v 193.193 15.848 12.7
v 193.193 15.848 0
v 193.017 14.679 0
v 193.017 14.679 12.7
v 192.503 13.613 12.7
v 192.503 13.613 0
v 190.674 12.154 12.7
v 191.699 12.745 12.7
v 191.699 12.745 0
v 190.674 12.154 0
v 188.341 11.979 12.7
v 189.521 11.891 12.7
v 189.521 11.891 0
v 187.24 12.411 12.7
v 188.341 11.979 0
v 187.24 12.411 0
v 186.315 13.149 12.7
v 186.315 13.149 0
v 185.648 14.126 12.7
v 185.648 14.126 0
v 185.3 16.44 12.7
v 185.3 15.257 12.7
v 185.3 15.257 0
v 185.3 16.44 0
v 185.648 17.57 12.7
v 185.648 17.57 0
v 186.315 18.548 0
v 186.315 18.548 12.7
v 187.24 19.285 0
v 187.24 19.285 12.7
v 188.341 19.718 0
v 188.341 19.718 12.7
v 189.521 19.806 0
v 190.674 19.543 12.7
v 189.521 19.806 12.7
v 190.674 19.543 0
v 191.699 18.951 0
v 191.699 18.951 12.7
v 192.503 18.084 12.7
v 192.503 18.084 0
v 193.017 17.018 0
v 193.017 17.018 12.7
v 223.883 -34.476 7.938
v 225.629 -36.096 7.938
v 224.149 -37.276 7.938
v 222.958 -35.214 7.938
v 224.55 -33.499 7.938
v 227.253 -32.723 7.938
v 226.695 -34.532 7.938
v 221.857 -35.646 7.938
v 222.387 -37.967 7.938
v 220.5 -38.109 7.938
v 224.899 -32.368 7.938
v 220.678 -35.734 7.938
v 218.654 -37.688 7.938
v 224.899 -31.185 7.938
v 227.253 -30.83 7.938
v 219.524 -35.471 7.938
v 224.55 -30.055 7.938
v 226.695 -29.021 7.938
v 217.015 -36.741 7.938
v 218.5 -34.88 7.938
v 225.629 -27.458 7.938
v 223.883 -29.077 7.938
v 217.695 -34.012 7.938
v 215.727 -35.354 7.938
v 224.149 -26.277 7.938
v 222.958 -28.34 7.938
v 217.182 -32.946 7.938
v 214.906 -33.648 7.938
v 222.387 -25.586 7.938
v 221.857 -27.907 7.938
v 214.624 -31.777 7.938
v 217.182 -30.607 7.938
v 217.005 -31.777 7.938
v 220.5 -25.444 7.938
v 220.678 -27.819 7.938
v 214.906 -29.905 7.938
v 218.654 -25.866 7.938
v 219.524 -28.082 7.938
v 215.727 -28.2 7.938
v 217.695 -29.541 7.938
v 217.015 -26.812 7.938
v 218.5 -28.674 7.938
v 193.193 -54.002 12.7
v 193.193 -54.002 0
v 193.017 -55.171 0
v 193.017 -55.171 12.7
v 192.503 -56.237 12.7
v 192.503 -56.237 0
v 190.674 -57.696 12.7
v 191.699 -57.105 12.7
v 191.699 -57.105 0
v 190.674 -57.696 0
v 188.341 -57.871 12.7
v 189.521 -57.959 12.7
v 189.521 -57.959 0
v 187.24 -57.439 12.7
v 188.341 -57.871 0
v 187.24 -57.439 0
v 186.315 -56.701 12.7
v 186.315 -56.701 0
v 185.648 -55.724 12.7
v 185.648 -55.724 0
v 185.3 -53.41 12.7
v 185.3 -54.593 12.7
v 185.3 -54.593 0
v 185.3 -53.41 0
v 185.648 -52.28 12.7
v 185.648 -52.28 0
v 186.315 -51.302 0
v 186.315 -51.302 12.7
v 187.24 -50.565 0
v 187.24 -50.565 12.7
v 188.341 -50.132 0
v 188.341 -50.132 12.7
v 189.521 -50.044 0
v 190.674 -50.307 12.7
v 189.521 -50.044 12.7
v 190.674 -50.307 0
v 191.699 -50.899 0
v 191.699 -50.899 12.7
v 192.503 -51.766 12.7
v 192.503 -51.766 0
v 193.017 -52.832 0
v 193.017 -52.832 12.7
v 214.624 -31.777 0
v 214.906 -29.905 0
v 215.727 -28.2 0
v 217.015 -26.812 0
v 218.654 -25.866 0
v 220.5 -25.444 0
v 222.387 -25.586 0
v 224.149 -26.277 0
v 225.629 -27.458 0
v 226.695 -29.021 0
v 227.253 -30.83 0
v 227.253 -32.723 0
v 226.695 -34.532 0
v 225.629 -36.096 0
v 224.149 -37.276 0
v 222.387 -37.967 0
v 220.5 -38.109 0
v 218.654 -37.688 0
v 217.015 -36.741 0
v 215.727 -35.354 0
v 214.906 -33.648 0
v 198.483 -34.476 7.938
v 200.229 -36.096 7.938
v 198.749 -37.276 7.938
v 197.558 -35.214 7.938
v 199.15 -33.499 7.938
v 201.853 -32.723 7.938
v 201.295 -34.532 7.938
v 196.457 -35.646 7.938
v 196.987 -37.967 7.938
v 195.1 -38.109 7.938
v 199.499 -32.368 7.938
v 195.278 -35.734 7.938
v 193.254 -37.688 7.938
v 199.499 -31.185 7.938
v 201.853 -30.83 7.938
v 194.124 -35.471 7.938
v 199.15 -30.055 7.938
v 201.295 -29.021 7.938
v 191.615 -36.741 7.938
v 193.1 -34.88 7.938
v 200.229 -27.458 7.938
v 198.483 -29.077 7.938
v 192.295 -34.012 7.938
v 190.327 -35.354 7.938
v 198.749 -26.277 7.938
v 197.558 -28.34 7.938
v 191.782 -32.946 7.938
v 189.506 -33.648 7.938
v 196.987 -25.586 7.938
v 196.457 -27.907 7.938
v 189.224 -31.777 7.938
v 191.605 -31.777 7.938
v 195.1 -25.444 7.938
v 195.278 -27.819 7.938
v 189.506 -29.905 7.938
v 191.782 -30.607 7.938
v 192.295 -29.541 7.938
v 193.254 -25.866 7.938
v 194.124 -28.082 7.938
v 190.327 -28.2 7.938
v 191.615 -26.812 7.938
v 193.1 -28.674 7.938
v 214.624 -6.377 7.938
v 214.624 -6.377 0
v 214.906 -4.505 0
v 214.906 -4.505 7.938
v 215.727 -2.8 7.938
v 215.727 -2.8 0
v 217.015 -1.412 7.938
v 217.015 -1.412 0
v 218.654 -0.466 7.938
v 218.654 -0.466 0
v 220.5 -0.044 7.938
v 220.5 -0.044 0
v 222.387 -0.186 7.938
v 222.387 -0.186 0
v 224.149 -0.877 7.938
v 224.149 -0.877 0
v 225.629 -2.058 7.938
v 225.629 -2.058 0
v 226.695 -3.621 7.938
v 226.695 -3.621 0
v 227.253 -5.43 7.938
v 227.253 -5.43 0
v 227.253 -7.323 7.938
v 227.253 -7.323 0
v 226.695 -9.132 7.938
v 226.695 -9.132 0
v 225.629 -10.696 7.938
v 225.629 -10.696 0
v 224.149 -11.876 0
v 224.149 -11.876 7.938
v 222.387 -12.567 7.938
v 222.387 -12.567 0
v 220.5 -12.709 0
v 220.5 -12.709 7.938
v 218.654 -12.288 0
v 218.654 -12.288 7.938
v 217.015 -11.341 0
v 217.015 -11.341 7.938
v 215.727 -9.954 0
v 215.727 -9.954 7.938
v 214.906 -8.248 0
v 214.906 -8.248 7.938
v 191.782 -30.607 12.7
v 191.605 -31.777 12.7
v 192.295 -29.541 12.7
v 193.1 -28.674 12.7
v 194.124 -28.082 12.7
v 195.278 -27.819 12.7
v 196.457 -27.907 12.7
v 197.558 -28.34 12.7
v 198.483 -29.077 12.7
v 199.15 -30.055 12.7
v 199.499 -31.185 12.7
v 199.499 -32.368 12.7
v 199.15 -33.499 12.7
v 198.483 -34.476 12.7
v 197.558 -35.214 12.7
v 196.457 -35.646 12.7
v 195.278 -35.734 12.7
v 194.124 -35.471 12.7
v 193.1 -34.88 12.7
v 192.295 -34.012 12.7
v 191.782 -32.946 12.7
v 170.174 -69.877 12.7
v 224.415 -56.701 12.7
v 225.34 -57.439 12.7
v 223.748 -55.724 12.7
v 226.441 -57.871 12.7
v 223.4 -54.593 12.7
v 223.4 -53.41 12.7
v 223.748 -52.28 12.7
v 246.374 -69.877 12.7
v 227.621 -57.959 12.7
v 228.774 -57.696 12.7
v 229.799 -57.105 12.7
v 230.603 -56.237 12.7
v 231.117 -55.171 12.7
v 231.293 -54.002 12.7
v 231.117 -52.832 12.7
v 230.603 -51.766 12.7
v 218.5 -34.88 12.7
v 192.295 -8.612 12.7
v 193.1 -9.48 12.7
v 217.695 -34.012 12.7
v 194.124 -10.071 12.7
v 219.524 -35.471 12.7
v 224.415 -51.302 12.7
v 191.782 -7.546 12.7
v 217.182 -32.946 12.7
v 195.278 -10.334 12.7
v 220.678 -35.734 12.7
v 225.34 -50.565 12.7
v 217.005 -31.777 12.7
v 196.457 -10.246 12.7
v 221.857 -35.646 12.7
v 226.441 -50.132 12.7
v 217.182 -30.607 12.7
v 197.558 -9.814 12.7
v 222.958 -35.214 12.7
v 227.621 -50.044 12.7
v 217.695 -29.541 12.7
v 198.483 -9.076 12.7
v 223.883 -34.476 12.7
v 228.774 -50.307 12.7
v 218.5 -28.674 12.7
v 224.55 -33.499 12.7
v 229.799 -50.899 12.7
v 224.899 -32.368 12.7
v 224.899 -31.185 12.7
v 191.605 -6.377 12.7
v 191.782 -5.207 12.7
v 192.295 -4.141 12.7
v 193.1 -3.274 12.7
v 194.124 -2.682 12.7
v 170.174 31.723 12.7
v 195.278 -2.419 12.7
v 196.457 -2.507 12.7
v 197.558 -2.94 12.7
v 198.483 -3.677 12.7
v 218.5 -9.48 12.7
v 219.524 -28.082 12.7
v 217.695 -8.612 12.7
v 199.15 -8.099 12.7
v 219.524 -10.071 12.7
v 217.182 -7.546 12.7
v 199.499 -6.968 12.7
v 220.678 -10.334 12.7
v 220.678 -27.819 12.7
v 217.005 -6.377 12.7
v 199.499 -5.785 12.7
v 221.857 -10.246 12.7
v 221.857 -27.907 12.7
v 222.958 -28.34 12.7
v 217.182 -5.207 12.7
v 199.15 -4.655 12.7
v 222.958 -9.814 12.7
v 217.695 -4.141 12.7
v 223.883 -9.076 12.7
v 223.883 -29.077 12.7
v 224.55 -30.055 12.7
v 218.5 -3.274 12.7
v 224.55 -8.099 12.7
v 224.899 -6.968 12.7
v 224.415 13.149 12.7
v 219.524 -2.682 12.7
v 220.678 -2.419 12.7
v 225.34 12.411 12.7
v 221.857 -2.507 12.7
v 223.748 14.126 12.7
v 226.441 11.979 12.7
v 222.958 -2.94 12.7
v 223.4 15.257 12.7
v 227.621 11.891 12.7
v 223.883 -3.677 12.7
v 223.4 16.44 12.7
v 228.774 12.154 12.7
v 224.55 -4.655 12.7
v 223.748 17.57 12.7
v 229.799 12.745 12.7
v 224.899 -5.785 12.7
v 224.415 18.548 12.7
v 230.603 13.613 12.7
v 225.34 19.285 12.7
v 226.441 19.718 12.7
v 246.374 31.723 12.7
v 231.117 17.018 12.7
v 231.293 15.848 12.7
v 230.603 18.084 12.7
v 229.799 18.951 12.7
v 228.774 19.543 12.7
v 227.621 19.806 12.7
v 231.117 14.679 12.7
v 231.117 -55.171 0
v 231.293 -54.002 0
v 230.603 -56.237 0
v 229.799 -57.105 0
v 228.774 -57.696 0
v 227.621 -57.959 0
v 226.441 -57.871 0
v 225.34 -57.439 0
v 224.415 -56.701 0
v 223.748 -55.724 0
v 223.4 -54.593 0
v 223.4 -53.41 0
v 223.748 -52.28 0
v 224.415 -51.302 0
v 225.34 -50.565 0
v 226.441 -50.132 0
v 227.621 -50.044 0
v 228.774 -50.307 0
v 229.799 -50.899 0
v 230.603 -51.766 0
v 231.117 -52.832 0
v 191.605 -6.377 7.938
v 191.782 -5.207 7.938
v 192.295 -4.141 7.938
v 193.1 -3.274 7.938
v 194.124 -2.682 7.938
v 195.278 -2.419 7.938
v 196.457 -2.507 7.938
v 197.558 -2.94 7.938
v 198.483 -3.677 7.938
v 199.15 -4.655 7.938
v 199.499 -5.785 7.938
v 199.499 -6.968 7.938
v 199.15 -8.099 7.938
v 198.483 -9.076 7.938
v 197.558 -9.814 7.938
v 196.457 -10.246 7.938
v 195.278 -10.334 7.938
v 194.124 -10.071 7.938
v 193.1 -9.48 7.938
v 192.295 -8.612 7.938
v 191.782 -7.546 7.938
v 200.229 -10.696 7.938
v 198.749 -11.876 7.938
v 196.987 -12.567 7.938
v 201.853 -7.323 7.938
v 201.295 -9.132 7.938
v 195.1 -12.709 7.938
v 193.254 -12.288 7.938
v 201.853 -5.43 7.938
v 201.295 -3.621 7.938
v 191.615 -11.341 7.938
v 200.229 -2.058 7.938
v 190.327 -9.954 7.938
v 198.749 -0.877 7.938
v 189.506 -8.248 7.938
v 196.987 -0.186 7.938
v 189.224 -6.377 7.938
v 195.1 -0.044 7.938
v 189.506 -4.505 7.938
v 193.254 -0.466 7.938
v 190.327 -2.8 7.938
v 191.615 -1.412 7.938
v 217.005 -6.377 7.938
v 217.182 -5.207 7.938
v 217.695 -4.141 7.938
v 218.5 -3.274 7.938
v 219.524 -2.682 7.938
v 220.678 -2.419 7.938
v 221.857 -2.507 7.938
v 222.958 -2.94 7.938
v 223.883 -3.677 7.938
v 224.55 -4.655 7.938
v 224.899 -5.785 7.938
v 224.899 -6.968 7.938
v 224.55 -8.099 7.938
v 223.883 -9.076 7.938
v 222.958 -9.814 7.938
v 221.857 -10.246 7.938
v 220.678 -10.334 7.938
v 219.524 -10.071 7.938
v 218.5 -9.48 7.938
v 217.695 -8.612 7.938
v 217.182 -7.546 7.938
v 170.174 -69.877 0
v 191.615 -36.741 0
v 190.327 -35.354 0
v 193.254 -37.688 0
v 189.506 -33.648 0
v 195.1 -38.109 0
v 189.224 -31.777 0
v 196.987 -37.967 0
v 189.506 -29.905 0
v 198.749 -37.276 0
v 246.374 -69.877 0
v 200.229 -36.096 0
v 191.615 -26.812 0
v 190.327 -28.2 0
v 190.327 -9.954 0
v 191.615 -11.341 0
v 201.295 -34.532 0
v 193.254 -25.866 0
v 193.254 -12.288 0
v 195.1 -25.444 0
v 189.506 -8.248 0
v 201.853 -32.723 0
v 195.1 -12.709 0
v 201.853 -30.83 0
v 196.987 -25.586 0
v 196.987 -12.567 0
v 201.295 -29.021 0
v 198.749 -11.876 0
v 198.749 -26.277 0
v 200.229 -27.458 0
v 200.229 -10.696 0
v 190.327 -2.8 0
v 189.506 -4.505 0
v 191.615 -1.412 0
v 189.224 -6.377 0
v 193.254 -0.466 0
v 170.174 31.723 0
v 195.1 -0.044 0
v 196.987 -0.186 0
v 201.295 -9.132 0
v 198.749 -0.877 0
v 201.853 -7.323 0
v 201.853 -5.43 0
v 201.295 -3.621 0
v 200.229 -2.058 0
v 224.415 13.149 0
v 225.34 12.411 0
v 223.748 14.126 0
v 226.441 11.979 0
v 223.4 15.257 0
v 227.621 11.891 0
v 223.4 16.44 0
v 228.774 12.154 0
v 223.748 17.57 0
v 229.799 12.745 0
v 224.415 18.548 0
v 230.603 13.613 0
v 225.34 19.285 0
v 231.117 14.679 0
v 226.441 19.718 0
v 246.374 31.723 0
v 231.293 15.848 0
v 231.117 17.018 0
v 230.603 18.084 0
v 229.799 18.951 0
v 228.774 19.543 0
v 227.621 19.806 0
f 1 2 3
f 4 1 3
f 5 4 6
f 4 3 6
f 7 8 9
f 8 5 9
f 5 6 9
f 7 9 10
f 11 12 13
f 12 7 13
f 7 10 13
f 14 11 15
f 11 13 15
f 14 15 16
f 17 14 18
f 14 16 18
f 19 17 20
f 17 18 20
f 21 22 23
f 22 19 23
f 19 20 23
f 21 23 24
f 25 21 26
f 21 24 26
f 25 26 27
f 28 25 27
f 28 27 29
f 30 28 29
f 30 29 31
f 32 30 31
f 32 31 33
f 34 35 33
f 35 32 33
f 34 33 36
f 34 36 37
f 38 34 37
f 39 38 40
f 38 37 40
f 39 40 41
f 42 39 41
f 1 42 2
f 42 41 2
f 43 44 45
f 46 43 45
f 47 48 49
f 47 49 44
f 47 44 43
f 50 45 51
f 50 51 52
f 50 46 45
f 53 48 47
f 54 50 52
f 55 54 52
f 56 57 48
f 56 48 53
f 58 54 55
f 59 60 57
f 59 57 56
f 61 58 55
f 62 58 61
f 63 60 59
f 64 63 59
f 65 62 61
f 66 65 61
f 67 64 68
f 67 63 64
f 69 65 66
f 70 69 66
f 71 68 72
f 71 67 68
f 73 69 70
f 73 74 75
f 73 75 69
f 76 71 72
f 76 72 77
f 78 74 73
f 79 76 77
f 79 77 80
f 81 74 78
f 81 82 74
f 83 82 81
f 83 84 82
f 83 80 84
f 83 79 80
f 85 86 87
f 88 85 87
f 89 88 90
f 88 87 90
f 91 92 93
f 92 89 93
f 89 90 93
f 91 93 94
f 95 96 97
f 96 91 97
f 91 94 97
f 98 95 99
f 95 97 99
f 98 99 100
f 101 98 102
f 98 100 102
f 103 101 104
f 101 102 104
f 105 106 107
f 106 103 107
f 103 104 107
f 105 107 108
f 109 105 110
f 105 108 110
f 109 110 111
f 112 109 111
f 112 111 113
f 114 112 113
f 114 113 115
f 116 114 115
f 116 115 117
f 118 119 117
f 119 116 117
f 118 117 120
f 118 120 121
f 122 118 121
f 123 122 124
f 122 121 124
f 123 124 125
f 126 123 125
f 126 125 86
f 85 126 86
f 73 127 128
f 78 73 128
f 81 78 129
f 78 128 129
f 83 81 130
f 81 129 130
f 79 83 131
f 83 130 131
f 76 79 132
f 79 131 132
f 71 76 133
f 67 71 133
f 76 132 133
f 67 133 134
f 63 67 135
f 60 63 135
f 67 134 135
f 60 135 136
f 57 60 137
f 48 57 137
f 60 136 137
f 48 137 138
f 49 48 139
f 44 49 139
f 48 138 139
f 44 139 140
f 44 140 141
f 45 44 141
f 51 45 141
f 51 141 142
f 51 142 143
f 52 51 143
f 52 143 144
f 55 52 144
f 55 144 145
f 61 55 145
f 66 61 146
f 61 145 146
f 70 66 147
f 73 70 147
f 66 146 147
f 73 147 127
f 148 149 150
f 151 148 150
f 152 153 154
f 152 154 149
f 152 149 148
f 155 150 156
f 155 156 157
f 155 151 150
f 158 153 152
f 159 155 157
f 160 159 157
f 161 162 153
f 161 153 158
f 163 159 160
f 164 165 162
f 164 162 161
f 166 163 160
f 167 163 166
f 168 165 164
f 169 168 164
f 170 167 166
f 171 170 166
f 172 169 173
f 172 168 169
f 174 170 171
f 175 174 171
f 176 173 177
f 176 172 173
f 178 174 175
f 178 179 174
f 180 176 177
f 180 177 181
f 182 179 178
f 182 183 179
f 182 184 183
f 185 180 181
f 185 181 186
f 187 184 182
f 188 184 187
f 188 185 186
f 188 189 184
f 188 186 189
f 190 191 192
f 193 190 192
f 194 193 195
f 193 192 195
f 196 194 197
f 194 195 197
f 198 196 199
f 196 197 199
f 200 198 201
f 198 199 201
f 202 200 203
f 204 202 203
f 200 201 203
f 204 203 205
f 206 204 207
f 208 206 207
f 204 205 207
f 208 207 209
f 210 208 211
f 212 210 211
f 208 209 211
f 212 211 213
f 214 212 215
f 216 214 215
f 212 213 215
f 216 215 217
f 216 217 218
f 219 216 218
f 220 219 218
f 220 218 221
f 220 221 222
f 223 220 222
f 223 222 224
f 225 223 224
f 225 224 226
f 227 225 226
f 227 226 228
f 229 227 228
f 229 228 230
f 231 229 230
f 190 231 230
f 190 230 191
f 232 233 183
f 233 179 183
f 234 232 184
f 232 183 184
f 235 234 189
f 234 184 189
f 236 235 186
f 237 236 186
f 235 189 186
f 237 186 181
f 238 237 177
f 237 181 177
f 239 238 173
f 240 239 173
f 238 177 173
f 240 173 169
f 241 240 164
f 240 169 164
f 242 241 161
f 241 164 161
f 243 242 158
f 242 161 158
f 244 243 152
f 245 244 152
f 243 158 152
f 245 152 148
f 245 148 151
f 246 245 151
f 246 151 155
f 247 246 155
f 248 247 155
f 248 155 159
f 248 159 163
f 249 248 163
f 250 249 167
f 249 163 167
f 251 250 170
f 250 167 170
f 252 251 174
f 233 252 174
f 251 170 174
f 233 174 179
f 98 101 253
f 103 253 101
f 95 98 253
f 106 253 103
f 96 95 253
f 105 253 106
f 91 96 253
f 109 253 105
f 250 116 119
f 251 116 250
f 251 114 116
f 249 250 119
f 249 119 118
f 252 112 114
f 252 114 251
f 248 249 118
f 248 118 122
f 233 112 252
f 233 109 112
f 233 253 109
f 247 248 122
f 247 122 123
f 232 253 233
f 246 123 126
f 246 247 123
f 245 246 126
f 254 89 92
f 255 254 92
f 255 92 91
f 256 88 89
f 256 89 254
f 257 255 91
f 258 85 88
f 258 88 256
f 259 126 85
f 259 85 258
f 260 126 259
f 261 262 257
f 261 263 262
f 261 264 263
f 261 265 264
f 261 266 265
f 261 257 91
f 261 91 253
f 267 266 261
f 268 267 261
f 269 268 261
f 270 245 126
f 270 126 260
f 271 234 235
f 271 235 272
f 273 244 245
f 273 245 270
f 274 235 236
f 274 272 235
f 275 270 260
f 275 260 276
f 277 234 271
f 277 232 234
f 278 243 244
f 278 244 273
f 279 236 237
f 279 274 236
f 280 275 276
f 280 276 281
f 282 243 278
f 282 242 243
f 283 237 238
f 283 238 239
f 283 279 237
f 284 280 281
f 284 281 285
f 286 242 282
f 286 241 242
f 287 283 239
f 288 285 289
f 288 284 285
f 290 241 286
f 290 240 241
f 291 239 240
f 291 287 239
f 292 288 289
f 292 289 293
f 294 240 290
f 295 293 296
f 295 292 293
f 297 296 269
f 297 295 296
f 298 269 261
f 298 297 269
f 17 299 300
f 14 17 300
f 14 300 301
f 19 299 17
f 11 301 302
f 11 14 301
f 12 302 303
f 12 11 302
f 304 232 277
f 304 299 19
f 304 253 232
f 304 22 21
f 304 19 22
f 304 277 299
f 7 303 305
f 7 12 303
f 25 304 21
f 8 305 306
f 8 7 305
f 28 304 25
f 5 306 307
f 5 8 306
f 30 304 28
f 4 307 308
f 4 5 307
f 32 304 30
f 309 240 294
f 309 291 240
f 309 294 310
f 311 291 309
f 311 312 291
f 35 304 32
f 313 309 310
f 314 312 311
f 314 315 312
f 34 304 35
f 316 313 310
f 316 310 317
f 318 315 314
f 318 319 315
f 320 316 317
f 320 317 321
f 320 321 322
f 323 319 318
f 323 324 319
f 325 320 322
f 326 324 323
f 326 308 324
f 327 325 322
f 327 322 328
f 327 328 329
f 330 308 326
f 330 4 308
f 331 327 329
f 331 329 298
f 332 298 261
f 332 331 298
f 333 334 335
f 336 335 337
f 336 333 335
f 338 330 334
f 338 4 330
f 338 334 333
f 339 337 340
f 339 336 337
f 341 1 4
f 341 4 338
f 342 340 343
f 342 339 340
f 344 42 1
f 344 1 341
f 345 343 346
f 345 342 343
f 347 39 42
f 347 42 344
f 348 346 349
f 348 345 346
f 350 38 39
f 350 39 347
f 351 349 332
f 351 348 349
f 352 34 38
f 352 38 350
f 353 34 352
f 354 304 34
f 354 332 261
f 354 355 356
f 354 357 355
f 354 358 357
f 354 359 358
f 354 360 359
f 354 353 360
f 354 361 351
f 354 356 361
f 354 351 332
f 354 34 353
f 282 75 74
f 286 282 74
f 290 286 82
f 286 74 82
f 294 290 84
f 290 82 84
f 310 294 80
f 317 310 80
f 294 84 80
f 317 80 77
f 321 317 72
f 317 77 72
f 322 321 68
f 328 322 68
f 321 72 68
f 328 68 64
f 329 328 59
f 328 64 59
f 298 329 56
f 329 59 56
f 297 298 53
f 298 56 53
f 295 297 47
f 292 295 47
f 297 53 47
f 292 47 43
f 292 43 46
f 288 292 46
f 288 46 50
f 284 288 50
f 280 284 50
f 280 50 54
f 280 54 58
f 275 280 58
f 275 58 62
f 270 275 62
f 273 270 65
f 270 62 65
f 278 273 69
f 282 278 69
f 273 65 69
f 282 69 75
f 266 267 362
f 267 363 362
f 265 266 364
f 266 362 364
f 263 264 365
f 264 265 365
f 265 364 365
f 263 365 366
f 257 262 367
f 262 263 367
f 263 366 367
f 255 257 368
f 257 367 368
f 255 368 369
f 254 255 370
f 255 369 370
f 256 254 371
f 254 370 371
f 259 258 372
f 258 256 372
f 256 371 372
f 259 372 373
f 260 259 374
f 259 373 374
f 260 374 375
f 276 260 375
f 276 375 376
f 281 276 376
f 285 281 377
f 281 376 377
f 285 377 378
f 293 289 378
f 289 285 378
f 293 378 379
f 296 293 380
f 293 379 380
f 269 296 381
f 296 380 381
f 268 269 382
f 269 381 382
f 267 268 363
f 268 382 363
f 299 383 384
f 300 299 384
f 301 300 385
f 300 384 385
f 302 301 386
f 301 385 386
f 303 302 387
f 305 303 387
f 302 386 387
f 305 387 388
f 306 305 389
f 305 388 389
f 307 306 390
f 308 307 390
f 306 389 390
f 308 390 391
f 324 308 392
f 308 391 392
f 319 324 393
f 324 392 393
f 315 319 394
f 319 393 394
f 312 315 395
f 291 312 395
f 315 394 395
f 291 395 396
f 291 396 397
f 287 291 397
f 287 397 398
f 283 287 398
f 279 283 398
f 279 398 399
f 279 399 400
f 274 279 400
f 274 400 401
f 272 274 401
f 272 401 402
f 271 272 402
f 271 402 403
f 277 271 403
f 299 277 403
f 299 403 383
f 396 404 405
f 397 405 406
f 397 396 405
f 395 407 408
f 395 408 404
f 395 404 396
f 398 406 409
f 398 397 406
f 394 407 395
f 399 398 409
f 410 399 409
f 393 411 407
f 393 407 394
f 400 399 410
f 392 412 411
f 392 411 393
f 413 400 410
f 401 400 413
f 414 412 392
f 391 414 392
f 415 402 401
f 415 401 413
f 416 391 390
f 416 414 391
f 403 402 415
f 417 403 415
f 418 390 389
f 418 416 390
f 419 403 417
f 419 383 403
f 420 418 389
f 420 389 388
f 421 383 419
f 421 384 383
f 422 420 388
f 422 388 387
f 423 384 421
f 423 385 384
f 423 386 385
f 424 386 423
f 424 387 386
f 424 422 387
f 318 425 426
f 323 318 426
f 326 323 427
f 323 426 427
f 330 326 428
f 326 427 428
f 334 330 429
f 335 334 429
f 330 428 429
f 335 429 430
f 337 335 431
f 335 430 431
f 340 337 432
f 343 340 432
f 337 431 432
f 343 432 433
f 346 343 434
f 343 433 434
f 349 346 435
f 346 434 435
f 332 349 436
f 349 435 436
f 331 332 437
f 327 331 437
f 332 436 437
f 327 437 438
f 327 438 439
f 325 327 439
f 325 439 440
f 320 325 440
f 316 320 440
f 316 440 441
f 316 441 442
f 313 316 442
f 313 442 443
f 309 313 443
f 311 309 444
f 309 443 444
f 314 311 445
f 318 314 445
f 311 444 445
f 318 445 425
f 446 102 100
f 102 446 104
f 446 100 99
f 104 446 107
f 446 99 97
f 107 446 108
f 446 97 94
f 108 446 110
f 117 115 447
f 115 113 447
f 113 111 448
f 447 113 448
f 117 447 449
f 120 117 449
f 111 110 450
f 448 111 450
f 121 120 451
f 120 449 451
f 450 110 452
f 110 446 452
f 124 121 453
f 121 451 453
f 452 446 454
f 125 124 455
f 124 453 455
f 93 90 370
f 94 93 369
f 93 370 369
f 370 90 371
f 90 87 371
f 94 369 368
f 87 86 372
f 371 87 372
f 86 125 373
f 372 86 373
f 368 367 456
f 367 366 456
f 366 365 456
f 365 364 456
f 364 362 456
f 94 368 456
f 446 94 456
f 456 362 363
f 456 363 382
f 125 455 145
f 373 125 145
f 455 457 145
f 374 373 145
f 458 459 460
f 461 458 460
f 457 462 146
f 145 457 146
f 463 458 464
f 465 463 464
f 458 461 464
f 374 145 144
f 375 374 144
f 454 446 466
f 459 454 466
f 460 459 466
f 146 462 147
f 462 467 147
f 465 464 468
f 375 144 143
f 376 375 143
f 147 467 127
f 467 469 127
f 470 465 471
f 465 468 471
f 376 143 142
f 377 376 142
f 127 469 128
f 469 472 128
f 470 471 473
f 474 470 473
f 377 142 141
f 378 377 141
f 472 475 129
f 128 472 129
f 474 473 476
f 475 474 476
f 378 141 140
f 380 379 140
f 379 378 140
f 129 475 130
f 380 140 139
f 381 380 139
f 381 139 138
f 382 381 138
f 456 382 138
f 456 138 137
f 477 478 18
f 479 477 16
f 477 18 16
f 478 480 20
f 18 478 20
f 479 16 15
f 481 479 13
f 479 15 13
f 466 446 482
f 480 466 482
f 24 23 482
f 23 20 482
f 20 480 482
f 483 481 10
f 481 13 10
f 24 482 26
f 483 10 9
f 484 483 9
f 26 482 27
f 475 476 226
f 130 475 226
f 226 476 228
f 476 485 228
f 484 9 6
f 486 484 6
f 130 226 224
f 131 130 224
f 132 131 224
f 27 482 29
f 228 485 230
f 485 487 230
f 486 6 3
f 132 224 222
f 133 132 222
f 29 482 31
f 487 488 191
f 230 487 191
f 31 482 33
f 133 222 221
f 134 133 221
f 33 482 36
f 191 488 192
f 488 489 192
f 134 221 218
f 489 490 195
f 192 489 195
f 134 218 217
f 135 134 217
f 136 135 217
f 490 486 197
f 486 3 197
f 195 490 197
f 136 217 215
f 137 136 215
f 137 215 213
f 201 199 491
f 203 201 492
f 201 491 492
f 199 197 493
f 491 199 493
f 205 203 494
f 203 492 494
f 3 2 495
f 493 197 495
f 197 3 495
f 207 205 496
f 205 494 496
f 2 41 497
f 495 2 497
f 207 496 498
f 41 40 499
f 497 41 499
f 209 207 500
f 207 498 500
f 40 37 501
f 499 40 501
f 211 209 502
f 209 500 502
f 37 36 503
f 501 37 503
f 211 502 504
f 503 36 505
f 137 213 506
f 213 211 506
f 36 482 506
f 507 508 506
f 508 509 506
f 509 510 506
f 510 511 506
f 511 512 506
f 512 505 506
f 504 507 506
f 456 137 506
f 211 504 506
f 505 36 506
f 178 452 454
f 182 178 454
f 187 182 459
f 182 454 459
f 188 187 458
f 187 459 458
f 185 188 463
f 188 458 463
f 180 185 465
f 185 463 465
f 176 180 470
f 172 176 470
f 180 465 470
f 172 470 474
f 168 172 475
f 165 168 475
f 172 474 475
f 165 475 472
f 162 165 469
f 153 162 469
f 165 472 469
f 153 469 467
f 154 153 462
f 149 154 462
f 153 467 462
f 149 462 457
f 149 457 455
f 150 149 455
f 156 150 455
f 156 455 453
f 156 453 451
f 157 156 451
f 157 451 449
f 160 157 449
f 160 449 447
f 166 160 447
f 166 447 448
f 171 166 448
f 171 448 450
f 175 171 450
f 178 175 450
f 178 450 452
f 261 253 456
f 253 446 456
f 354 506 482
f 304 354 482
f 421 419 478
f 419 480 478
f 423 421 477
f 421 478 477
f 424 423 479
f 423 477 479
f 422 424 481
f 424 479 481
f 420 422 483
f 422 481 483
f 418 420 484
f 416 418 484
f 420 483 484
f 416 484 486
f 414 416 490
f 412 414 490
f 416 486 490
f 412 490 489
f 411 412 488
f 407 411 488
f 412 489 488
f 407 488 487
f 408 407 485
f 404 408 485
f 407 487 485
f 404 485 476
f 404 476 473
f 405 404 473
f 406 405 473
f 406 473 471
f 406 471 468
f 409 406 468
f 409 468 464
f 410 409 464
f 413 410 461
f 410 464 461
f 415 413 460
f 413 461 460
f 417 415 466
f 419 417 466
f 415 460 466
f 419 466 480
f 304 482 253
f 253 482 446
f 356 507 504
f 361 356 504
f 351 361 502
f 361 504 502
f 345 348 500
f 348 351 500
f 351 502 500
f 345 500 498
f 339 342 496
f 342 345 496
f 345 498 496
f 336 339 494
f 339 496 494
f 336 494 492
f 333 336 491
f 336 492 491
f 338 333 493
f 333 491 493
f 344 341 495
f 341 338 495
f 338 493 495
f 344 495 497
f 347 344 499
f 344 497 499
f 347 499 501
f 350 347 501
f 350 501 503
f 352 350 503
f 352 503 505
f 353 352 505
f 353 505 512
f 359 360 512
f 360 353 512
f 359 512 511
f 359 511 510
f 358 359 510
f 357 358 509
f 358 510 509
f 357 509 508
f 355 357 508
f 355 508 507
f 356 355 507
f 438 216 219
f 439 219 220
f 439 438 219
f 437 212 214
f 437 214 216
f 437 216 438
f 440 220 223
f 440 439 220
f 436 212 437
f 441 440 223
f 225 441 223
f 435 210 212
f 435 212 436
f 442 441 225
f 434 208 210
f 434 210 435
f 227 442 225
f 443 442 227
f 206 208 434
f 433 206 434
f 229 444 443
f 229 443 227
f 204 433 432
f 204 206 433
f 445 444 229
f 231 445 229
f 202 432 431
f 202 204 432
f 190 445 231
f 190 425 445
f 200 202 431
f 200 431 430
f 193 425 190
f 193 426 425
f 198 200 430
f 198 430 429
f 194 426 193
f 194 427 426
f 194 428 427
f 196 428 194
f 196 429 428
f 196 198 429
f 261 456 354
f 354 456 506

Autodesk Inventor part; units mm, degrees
ref_plane "YZ Plane" through (0, 0, 0) normal (1, 0, 0) x (0, 1, 0)
ref_plane "XZ Plane" through (0, 0, 0) normal (0, 1, 0) x (-1, 0, 0)
ref_plane "XY Plane" through (0, 0, 0) normal (0, 0, 1) x (1, 0, 0)
sketch "Sketch1" plane through (0, 0, 0) normal (0, 0, 1) x (1, 0, 0)
  line L0 (246.3741, 31.7234) -> (246.3741, -882.6766) construction
  line L1 (234.1821, 31.7234) -> (231.3881, 31.7234) construction
  line L2 (223.2601, 31.7234) -> (220.4661, 31.7234) construction
  line L3 (199.5111, 31.7234) -> (196.0821, 31.7234) construction
  line L4 (182.3661, 31.7234) -> (178.9371, 31.7234) construction
  line L5 (246.3741, 31.7234) -> (170.1741, 31.7234)
  line L6 (170.1741, 31.7234) -> (170.1741, -69.8766)
  line L7 (170.1741, -69.8766) -> (246.3741, -69.8766)
  line L8 (246.3741, -69.8766) -> (246.3741, 31.7234)
  circle A0 centre (227.3241, 15.8484) radius 3.9688
  line L9 (208.2741, -69.8766) -> (208.2741, 31.7234) construction
  line L10 (246.3741, -19.0766) -> (170.1741, -19.0766) construction
  circle A1 centre (227.3241, -54.0016) radius 3.9688
  circle A2 centre (189.2241, 15.8484) radius 3.9688
  circle A3 centre (189.2241, -54.0016) radius 3.9688
  point P0 (0, 0)
  dimension "d0" = 76.2
  dimension "d1" = 101.6
  dimension "d2" = 7.9375
  dimension "d3" = 15.875
  dimension "d4" = 19.05
extrude "Extrusion1" add sketch "Sketch1" along normal blind 12.7
sketch "Sketch3" plane through (0, 0, 0) normal (0, 0, -1) x (-1, 0, 0)
  line L0 (-186.0491, -41.3016) -> (-230.4991, -41.3016)
  line L1 (-230.4991, -41.3016) -> (-230.4991, 3.1484)
  line L2 (-230.4991, 3.1484) -> (-186.0491, 3.1484)
  line L3 (-186.0491, 3.1484) -> (-186.0491, -41.3016)
  line L4 (-170.1741, -69.8766) -> (-246.3741, -69.8766) projected
  line L5 (-170.1741, 31.7234) -> (-170.1741, -69.8766) projected
  line L6 (-246.3741, 31.7234) -> (-170.1741, 31.7234) projected
  circle A0 centre (-195.5741, -6.3766) radius 6.35
  circle A1 centre (-195.5741, -31.7766) radius 6.35
  circle A2 centre (-220.9741, -6.3766) radius 6.35
  circle A3 centre (-220.9741, -31.7766) radius 6.35
  point P0 (0, 0)
  dimension "d16" = 44.45
  dimension "d17" = 44.45
  dimension "d18" = 28.575
  dimension "d19" = 15.875
  dimension "d23" = 12.7
  dimension "d24" = 9.525
  dimension "d25" = 9.525
  dimension "d28" = 25.4
  dimension "d31" = 25.4
extrude "Extrusion3" cut sketch "Sketch3" against normal blind 7.9375 contours A0 | A1 | A2 | A3
sketch "Sketch4" plane through (195.5741, -6.3766, 7.9375) normal (0, 0, -1) x (-1, 0, 0)
  circle A0 centre (0, 0) radius 6.35 projected
  circle A1 centre (0, -25.4) radius 6.35 projected
  circle A2 centre (-25.4, 0) radius 6.35 projected
  circle A3 centre (-25.4, -25.4) radius 6.35 projected
  circle A4 centre (0, 0) radius 3.9688
  line L0 (0, 0) -> (0, -11.1628) construction
  line L1 (0, 0) -> (-15.7699, 0) construction
  circle A5 centre (0, -25.4) radius 3.9688
  circle A6 centre (-25.4, 0) radius 3.9688
  circle A7 centre (-25.4, -25.4) radius 3.9688
  point P0 (195.5741, 6.3766)
  dimension "d36" = 7.9375
  dimension "d37" = 7.9375
  dimension "d38" = 7.9375
  dimension "d39" = 7.9375
extrude "Extrusion4" cut sketch "Sketch4" against normal blind 7.9375 contours A4 | A5 | A6 | A7
properties part number "Corner Stands"
